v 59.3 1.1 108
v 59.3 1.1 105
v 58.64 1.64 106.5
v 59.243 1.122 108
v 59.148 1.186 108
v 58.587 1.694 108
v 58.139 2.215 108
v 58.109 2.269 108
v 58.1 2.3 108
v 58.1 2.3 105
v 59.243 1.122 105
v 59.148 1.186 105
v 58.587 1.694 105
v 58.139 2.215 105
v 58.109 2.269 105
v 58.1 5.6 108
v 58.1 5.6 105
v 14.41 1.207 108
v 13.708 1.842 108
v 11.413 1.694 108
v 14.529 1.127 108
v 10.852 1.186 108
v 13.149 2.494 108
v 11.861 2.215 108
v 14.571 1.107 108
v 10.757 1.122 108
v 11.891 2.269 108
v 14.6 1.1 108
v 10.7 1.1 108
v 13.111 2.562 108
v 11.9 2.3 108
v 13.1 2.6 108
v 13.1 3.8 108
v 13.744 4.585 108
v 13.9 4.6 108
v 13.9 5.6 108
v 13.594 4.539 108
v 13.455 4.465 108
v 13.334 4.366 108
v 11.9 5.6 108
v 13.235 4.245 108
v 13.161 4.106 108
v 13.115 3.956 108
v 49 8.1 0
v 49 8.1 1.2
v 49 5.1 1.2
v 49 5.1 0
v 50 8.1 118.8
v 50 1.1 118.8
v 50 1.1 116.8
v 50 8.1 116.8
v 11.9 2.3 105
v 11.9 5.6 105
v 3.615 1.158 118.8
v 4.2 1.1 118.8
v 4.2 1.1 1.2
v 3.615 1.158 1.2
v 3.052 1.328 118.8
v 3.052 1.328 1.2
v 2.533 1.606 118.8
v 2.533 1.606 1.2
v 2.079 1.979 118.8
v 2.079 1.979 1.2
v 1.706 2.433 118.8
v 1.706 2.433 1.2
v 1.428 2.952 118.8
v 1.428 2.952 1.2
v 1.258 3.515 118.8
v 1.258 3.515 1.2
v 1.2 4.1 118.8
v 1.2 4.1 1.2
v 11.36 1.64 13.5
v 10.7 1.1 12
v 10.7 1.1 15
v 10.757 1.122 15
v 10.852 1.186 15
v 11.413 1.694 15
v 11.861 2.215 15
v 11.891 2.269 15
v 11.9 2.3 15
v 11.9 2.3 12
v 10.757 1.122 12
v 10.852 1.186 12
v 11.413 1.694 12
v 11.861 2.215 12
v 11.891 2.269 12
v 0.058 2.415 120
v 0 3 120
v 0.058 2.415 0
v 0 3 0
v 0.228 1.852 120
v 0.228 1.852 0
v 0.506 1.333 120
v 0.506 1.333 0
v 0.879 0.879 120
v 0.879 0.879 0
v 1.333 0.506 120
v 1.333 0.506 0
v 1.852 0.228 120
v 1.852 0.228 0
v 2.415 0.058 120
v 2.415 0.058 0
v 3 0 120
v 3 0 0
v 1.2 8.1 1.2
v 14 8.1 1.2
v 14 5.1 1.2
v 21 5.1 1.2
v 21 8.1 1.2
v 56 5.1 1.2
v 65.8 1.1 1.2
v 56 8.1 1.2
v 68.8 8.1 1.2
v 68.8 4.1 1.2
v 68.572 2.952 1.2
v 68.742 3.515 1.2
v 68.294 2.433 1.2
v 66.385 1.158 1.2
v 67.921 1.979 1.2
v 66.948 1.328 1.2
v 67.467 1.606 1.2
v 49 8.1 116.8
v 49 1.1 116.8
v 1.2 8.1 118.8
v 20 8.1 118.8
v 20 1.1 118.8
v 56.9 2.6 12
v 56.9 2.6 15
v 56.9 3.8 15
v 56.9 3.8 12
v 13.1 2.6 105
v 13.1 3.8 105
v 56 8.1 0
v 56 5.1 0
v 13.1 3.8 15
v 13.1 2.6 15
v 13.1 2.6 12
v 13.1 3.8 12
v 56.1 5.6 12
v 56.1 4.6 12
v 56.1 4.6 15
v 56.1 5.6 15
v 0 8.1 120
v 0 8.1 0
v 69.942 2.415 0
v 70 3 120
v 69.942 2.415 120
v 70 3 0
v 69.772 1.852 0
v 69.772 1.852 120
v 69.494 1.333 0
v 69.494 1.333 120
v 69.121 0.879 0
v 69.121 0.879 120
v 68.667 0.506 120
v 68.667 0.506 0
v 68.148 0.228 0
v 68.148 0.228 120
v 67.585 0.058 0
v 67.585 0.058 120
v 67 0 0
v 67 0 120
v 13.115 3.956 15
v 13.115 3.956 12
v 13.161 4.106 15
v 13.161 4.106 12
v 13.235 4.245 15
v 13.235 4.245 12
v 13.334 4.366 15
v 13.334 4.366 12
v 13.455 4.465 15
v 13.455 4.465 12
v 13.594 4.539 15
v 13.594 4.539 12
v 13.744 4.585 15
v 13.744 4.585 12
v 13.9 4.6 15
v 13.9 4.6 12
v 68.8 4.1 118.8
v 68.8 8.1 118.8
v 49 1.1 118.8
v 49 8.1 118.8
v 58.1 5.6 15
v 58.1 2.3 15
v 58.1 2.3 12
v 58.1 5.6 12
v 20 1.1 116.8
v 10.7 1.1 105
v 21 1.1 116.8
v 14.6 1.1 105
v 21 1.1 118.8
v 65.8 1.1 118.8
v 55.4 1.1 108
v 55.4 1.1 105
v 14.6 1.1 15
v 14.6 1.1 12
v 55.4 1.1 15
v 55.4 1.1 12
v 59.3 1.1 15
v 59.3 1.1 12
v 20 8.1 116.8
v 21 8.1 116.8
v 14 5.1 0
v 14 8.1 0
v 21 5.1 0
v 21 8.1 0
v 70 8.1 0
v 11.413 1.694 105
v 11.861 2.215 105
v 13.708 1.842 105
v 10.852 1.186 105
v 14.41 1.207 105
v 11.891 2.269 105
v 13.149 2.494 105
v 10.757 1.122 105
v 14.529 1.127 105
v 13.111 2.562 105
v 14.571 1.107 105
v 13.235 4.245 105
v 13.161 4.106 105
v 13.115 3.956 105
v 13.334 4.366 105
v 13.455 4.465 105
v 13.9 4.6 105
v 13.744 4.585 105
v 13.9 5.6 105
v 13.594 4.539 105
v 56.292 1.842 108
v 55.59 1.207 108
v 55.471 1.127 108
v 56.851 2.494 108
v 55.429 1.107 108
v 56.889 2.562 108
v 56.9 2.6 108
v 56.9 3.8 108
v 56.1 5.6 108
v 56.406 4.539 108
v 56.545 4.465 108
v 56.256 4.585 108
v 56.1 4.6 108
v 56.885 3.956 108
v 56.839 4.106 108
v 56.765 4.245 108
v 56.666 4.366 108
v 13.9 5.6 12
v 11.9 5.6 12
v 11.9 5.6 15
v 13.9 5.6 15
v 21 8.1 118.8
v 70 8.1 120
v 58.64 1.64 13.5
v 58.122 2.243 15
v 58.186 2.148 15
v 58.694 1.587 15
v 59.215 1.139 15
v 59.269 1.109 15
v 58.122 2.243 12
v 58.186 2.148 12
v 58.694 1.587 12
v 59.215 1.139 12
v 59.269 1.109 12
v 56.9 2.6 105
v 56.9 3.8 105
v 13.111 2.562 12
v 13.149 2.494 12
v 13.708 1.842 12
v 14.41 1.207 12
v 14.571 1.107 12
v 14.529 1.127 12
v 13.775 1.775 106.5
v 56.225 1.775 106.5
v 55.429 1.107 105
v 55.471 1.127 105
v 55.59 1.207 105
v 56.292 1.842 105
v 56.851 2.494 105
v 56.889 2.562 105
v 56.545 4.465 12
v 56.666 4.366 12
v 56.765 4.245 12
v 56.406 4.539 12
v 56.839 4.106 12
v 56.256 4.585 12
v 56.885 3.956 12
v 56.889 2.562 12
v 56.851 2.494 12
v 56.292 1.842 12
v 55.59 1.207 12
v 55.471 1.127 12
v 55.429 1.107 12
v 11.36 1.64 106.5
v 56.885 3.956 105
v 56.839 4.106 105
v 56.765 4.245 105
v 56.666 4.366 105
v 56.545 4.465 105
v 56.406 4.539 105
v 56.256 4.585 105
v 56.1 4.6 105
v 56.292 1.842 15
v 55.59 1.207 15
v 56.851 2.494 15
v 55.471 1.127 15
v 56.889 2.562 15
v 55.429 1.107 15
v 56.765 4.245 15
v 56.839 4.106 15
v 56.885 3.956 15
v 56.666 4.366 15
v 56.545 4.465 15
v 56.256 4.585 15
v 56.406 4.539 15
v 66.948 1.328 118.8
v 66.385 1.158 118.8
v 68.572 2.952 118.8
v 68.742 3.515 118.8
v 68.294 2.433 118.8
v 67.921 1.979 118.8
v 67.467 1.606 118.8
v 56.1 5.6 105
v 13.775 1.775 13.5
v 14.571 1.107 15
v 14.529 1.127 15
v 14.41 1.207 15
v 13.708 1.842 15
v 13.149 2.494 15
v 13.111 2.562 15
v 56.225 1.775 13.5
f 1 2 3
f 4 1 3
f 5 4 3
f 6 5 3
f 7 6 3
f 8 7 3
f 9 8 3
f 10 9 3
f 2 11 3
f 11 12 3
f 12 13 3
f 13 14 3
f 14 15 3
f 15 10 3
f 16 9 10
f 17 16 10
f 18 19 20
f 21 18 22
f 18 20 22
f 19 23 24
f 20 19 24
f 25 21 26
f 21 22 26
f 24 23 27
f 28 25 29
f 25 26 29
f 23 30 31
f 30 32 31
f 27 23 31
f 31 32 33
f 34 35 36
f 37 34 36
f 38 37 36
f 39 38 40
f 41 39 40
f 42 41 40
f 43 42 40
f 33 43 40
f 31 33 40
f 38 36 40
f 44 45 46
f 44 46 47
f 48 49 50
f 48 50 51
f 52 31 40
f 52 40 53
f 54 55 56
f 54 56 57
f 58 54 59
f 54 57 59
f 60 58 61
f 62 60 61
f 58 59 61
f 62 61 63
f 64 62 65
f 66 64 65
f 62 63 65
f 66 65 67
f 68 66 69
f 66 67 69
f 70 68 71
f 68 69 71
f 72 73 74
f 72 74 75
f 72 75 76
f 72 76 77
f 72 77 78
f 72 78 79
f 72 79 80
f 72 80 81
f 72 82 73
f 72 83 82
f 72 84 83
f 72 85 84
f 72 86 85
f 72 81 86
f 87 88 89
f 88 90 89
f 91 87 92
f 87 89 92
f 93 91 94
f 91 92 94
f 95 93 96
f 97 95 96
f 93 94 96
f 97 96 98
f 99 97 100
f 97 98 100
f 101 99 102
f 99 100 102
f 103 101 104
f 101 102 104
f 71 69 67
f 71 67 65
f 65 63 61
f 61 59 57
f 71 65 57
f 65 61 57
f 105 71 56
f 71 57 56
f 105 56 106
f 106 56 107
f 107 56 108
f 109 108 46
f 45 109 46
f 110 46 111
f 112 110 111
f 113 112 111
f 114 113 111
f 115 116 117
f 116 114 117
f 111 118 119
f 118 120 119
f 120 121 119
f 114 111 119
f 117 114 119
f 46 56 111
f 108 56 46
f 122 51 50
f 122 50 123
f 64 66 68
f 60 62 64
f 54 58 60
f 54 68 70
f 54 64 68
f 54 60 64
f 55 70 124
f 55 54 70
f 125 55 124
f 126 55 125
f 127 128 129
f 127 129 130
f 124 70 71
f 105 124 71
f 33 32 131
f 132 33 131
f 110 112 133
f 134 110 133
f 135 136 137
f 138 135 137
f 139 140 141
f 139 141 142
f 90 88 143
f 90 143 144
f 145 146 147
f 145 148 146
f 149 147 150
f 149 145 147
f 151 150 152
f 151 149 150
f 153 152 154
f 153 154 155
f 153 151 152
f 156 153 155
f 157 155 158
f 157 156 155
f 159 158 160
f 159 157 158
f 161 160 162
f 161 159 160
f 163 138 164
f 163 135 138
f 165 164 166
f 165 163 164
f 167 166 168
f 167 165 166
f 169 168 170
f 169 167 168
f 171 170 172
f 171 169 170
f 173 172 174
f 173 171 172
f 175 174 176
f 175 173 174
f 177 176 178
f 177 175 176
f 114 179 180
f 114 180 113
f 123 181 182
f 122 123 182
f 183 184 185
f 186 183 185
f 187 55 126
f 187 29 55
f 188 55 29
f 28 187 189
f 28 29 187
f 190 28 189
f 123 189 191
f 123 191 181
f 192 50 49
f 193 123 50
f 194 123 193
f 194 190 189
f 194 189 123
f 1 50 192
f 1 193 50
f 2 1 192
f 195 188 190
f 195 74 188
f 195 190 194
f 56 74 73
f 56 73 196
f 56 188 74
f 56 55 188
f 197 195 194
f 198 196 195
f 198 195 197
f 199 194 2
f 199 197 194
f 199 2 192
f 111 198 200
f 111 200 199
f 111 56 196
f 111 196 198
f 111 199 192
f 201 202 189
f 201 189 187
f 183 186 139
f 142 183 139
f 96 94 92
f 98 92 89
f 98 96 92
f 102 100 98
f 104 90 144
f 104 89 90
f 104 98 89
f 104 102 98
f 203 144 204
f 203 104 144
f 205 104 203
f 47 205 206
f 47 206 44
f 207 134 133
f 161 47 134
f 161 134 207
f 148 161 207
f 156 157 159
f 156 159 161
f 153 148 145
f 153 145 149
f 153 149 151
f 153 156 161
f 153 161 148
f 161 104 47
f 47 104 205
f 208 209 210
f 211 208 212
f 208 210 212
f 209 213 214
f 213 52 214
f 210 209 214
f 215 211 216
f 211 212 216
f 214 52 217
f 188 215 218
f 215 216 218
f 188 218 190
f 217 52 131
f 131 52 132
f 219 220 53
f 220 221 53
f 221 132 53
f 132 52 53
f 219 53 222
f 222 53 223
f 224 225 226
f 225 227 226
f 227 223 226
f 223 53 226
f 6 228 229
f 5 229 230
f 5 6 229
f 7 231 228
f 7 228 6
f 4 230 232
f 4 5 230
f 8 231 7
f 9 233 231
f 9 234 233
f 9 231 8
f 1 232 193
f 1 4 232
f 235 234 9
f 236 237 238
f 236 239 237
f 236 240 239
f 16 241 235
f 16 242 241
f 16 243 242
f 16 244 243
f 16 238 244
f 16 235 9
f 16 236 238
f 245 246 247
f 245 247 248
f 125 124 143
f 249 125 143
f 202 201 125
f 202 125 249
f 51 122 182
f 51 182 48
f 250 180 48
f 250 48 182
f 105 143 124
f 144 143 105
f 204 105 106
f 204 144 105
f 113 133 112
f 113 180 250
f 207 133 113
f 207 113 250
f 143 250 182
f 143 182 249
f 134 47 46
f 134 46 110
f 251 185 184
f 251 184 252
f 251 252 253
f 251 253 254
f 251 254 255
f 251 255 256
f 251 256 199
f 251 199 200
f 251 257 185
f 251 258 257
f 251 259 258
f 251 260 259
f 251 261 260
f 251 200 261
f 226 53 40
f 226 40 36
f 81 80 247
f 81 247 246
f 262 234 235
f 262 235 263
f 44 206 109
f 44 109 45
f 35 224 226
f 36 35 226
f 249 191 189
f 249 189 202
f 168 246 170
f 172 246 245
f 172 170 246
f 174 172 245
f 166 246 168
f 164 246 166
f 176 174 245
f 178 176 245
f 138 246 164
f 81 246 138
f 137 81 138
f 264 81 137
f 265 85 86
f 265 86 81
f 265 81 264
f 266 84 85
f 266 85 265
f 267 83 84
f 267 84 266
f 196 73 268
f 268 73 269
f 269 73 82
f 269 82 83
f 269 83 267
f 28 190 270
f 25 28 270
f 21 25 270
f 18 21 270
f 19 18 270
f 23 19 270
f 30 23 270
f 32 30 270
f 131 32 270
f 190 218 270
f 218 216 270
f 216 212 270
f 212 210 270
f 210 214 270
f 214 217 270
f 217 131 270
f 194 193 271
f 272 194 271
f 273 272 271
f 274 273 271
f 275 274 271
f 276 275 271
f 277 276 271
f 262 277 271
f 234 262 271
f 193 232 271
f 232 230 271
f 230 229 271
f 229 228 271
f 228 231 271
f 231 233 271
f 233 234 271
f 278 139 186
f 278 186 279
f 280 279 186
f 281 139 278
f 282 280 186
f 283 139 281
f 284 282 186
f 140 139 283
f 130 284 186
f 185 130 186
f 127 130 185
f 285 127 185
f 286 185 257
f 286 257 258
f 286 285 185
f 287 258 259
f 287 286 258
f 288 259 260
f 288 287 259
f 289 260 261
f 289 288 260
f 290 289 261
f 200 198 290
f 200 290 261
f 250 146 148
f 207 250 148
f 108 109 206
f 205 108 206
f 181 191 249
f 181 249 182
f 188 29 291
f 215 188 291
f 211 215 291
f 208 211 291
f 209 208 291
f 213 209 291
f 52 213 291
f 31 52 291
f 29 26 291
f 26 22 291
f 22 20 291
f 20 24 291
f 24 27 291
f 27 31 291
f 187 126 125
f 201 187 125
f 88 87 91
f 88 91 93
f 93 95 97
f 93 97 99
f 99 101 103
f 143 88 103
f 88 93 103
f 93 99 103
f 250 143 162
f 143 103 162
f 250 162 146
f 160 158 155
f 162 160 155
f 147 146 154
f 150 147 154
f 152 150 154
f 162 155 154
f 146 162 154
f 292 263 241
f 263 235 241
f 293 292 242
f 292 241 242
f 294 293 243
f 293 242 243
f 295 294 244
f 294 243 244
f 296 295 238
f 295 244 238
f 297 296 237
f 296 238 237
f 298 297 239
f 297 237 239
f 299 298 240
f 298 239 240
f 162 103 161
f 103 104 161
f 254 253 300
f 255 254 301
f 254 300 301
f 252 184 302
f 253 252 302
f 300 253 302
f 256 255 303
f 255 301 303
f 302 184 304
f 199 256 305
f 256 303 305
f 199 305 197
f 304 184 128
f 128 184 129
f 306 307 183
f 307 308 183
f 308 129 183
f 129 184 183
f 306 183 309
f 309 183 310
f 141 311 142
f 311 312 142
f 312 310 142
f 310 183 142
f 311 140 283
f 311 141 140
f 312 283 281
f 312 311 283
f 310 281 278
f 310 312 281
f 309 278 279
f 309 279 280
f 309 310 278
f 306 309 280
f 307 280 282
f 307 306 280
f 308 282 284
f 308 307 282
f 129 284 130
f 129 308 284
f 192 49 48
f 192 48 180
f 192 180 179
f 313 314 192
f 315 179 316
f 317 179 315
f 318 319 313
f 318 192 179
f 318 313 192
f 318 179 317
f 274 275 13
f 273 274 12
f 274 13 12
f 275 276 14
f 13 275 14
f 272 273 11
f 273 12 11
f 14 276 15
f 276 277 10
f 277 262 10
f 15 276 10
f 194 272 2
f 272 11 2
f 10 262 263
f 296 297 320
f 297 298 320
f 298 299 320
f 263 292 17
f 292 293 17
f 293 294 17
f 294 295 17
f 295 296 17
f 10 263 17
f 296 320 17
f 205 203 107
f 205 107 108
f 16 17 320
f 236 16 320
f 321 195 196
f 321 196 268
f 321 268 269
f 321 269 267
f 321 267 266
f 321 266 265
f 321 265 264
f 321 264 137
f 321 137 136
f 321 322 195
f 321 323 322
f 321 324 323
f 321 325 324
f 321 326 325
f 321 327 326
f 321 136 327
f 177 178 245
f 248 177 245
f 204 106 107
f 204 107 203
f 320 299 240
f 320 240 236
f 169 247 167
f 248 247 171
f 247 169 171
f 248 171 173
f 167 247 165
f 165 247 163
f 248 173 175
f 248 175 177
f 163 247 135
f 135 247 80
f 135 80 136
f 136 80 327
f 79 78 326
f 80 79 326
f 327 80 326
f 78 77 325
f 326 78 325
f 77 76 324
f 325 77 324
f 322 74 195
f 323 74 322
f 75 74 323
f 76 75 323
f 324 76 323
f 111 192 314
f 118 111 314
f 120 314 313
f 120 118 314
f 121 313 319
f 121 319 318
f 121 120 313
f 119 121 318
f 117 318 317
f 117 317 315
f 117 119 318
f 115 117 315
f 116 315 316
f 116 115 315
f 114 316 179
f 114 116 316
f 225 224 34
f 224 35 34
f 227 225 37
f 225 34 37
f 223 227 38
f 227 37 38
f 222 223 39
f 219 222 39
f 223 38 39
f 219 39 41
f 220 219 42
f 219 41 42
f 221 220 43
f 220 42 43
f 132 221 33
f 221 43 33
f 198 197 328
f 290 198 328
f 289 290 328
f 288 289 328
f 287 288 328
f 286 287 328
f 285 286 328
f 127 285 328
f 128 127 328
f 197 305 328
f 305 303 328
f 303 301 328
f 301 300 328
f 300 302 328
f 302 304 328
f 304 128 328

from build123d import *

# Parameters (mm, degrees)
SKETCH1_W           = 70
SKETCH1_H           = 120
BOSS_EXTRUDE1_DEPTH = 1.1
SKETCH2_W           = 70
SKETCH2_H           = 120
SKETCH2_W_2         = 67.6
SKETCH2_H_2         = 117.6
BOSS_EXTRUDE2_DEPTH = 7
SKETCH3_W           = 1.2
SKETCH3_H           = 3
BOSS_EXTRUDE3_DEPTH = 4.5
SKETCH5_W           = 0.8
SKETCH5_H           = 1
BOSS_EXTRUDE4_DEPTH = 3
SKETCH6_W           = 0.8
SKETCH6_H           = 1
BOSS_EXTRUDE5_DEPTH = 3
SKETCH7_W           = 7
SKETCH7_H           = 1.2
CUT_EXTRUDE1_DEPTH  = 3
SKETCH8_W           = 1
SKETCH8_H           = 7
BOSS_EXTRUDE6_DEPTH = 2
FILLET1_SIZE        = 1.5
FILLET2_SIZE        = 1.2
FILLET3_R           = 0.8
FILLET4_R           = 3


# Some blends are built 0.0001 mm under size
with BuildPart() as part:
    # Sketch1 → Boss-Extrude1 (new body)
    with BuildSketch(Plane(origin=(0, 0, 0), x_dir=(1, 0, 0), z_dir=(0, 1, 0))):
        with Locations((35, -60)):
            Rectangle(SKETCH1_W, SKETCH1_H)
    extrude(amount=BOSS_EXTRUDE1_DEPTH)

    # Sketch2 → Boss-Extrude2 (add)
    with BuildSketch(Plane(origin=(0, 1.1, 0), x_dir=(1, 0, 0), z_dir=(0, 1, 0))):
        with Locations((35, -60)):
            Rectangle(SKETCH2_W, SKETCH2_H)
        with Locations((35, -60)):
            Rectangle(SKETCH2_W_2, SKETCH2_H_2, mode=Mode.SUBTRACT)
    extrude(amount=BOSS_EXTRUDE2_DEPTH)

    # Sketch3 → Boss-Extrude3 (add)
    with BuildSketch(Plane(origin=(0, 1.1, 0), x_dir=(1, 0, 0), z_dir=(0, 1, 0))):
        with Locations((57.5, -13.5)):
            Rectangle(SKETCH3_W, SKETCH3_H)
        with Locations((12.5, -13.5)):
            Rectangle(SKETCH3_W, SKETCH3_H)
        with Locations((57.5, -106.5)):
            Rectangle(SKETCH3_W, SKETCH3_H)
        with Locations((12.5, -106.5)):
            Rectangle(SKETCH3_W, SKETCH3_H)
    extrude(amount=BOSS_EXTRUDE3_DEPTH)

    # Sketch5 → Boss-Extrude4 (add)
    with BuildSketch(Plane(origin=(0, 0, 12), x_dir=(-1, 0, 0), z_dir=(0, 0, -1))):
        with Locations((-56.5, 5.1)):
            Rectangle(SKETCH5_W, SKETCH5_H)
        with Locations((-13.5, 5.1)):
            Rectangle(SKETCH5_W, SKETCH5_H)
    extrude(amount=-BOSS_EXTRUDE4_DEPTH)

    # Sketch6 → Boss-Extrude5 (add)
    with BuildSketch(Plane(origin=(0, 0, 105), x_dir=(-1, 0, 0), z_dir=(0, 0, -1))):
        with Locations((-56.5, 5.1)):
            Rectangle(SKETCH6_W, SKETCH6_H)
        with Locations((-13.5, 5.1)):
            Rectangle(SKETCH6_W, SKETCH6_H)
    extrude(amount=-BOSS_EXTRUDE5_DEPTH)

    # Sketch7 → Cut-Extrude1 (cut)
    with BuildSketch(Plane(origin=(0, 8.1, 0), x_dir=(1, 0, 0), z_dir=(0, 1, 0))):
        with Locations((52.5, -0.6)):
            Rectangle(SKETCH7_W, SKETCH7_H)
        with Locations((17.5, -0.6)):
            Rectangle(SKETCH7_W, SKETCH7_H)
    extrude(amount=-CUT_EXTRUDE1_DEPTH, mode=Mode.SUBTRACT)

    # Sketch8 → Boss-Extrude6 (add)
    with BuildSketch(Plane(origin=(0, 0, 118.8), x_dir=(-1, 0, 0), z_dir=(0, 0, -1))):
        with Locations((-49.5, 4.6)):
            Rectangle(SKETCH8_W, SKETCH8_H)
        with Locations((-20.5, 4.6)):
            Rectangle(SKETCH8_W, SKETCH8_H)
    extrude(amount=BOSS_EXTRUDE6_DEPTH)

    # Fillet1
    # a fillet whose section is not a circle: 1.5 mm, written as the material it adds along each edge
    with BuildSketch(Plane(origin=(13.1, 1.1, 15), x_dir=(1, 0, 0), z_dir=(0, 0, -1))) as fillet1_piece_1:
        with BuildLine():
            Bezier((FILLET1_SIZE, 0), (0, 0), (0, -FILLET1_SIZE), weights=[1, 0.111111111, 1])
            Line((0, -FILLET1_SIZE), (0, 0))
            Line((0, 0), (FILLET1_SIZE, 0))
        make_face()
    extrude(amount=3)
    with BuildSketch(Plane(origin=(56.9, 1.1, 15), x_dir=(-1, 0, 0), z_dir=(0, 0, -1)), Plane(origin=(56.9, 1.1, 108), x_dir=(-1, 0, 0), z_dir=(0, 0, -1)), Plane(origin=(13.1, 1.1, 105), x_dir=(1, 0, 0), z_dir=(0, 0, 1))) as fillet1_piece_2:
        with BuildLine():
            Bezier((FILLET1_SIZE, 0), (0, 0), (0, FILLET1_SIZE), weights=[1, 0.111111111, 1])
            Line((0, FILLET1_SIZE), (0, 0))
            Line((0, 0), (FILLET1_SIZE, 0))
        make_face()
    extrude(amount=3)

    # Fillet2
    # a fillet whose section is not a circle: 1.2 mm, written as the material it adds along each edge
    with BuildSketch(Plane(origin=(11.9, 1.1, 12), x_dir=(-1, 0, 0), z_dir=(0, 0, 1)), Plane(origin=(58.1, 1.1, 12), x_dir=(0, 1, 0), z_dir=(0, 0, 1))) as fillet2_piece_1:
        with BuildLine():
            Bezier((FILLET2_SIZE, 0), (0, 0), (0, -FILLET2_SIZE), weights=[1, 0.111111111, 1])
            Line((0, -FILLET2_SIZE), (-FILLET2_SIZE * 0.02, -FILLET2_SIZE))
            Line((-FILLET2_SIZE * 0.02, -FILLET2_SIZE), (-FILLET2_SIZE * 0.02, FILLET2_SIZE * 0.02))
            Line((-FILLET2_SIZE * 0.02, FILLET2_SIZE * 0.02), (FILLET2_SIZE, FILLET2_SIZE * 0.02))
            Line((FILLET2_SIZE, FILLET2_SIZE * 0.02), (FILLET2_SIZE, 0))
        make_face()
    extrude(amount=3)
    with BuildSketch(Plane(origin=(58.1, 1.1, 105), x_dir=(1, 0, 0), z_dir=(0, 0, 1)), Plane(origin=(11.9, 1.1, 108), x_dir=(-1, 0, 0), z_dir=(0, 0, -1))) as fillet2_piece_2:
        with BuildLine():
            Bezier((FILLET2_SIZE, 0), (0, 0), (0, FILLET2_SIZE), weights=[1, 0.111111111, 1])
            Line((0, FILLET2_SIZE), (-FILLET2_SIZE * 0.02, FILLET2_SIZE))
            Line((-FILLET2_SIZE * 0.02, FILLET2_SIZE), (-FILLET2_SIZE * 0.02, -FILLET2_SIZE * 0.02))
            Line((-FILLET2_SIZE * 0.02, -FILLET2_SIZE * 0.02), (FILLET2_SIZE, -FILLET2_SIZE * 0.02))
            Line((FILLET2_SIZE, -FILLET2_SIZE * 0.02), (FILLET2_SIZE, 0))
        make_face()
    extrude(amount=3)

    # Fillet3
    fillet3_edges = [part.edges().sort_by_distance(p)[0] for p in [
        (56.9, 4.6, 106.5),
        (56.9, 4.6, 13.5),
        (13.1, 4.6, 13.5),
        (13.1, 4.6, 106.5),
    ]]
    fillet(fillet3_edges, radius=FILLET3_R - 0.0001)  # a hair under: the kernel refuses the full size

    # Fillet4
    fillet4_edges = [part.edges().sort_by_distance(p)[0] for p in [
        (1.2, 1.1, 60),
        (68.8, 1.1, 60),
        (70, 0, 60),
        (0, 0, 60),
    ]]
    fillet(fillet4_edges, radius=FILLET4_R)


solid = part.part
